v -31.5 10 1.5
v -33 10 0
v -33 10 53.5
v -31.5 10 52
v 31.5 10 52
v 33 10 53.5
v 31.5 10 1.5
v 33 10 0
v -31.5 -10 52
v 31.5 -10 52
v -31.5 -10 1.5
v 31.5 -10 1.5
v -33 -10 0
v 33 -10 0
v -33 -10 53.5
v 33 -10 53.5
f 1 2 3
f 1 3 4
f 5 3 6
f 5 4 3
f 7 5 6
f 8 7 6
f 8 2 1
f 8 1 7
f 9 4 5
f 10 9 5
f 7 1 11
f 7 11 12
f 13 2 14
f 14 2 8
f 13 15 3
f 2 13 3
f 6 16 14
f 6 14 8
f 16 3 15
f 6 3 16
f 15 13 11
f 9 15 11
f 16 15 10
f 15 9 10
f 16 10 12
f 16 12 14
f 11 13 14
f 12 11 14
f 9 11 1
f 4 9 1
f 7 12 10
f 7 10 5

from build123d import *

# Parameters (mm, degrees)
SKETCH_1_W        = 66
SKETCH_1_H        = 20
EXTRUDE_224_DEPTH = 1.5
EXTRUDE_START     = 1.5
SKETCH_2_W        = 1.5
SKETCH_2_H        = 20
EXTRUDE_307_DEPTH = 50.5
EXTRUDE_START_2   = 52
SKETCH_3_W        = 66
SKETCH_3_H        = 20
EXTRUDE_387_DEPTH = 1.5


with BuildPart() as part:
    # 草图1 → Extrude 224 (new body)
    with BuildSketch(Plane.XY):
        Rectangle(SKETCH_1_W, SKETCH_1_H)
    extrude(amount=EXTRUDE_224_DEPTH)

    # 草图2 → Extrude 307 (add)
    with BuildSketch(Plane.XY.offset(EXTRUDE_START)):
        with Locations((-32.25, 0)):
            Rectangle(SKETCH_2_W, SKETCH_2_H)
        with Locations((32.25, 0)):
            Rectangle(SKETCH_2_W, SKETCH_2_H)
    extrude(amount=EXTRUDE_307_DEPTH)

    # 草图3 → Extrude 387 (add)
    with BuildSketch(Plane.XY.offset(EXTRUDE_START_2)):
        Rectangle(SKETCH_3_W, SKETCH_3_H)
    extrude(amount=EXTRUDE_387_DEPTH)


solid = part.part
